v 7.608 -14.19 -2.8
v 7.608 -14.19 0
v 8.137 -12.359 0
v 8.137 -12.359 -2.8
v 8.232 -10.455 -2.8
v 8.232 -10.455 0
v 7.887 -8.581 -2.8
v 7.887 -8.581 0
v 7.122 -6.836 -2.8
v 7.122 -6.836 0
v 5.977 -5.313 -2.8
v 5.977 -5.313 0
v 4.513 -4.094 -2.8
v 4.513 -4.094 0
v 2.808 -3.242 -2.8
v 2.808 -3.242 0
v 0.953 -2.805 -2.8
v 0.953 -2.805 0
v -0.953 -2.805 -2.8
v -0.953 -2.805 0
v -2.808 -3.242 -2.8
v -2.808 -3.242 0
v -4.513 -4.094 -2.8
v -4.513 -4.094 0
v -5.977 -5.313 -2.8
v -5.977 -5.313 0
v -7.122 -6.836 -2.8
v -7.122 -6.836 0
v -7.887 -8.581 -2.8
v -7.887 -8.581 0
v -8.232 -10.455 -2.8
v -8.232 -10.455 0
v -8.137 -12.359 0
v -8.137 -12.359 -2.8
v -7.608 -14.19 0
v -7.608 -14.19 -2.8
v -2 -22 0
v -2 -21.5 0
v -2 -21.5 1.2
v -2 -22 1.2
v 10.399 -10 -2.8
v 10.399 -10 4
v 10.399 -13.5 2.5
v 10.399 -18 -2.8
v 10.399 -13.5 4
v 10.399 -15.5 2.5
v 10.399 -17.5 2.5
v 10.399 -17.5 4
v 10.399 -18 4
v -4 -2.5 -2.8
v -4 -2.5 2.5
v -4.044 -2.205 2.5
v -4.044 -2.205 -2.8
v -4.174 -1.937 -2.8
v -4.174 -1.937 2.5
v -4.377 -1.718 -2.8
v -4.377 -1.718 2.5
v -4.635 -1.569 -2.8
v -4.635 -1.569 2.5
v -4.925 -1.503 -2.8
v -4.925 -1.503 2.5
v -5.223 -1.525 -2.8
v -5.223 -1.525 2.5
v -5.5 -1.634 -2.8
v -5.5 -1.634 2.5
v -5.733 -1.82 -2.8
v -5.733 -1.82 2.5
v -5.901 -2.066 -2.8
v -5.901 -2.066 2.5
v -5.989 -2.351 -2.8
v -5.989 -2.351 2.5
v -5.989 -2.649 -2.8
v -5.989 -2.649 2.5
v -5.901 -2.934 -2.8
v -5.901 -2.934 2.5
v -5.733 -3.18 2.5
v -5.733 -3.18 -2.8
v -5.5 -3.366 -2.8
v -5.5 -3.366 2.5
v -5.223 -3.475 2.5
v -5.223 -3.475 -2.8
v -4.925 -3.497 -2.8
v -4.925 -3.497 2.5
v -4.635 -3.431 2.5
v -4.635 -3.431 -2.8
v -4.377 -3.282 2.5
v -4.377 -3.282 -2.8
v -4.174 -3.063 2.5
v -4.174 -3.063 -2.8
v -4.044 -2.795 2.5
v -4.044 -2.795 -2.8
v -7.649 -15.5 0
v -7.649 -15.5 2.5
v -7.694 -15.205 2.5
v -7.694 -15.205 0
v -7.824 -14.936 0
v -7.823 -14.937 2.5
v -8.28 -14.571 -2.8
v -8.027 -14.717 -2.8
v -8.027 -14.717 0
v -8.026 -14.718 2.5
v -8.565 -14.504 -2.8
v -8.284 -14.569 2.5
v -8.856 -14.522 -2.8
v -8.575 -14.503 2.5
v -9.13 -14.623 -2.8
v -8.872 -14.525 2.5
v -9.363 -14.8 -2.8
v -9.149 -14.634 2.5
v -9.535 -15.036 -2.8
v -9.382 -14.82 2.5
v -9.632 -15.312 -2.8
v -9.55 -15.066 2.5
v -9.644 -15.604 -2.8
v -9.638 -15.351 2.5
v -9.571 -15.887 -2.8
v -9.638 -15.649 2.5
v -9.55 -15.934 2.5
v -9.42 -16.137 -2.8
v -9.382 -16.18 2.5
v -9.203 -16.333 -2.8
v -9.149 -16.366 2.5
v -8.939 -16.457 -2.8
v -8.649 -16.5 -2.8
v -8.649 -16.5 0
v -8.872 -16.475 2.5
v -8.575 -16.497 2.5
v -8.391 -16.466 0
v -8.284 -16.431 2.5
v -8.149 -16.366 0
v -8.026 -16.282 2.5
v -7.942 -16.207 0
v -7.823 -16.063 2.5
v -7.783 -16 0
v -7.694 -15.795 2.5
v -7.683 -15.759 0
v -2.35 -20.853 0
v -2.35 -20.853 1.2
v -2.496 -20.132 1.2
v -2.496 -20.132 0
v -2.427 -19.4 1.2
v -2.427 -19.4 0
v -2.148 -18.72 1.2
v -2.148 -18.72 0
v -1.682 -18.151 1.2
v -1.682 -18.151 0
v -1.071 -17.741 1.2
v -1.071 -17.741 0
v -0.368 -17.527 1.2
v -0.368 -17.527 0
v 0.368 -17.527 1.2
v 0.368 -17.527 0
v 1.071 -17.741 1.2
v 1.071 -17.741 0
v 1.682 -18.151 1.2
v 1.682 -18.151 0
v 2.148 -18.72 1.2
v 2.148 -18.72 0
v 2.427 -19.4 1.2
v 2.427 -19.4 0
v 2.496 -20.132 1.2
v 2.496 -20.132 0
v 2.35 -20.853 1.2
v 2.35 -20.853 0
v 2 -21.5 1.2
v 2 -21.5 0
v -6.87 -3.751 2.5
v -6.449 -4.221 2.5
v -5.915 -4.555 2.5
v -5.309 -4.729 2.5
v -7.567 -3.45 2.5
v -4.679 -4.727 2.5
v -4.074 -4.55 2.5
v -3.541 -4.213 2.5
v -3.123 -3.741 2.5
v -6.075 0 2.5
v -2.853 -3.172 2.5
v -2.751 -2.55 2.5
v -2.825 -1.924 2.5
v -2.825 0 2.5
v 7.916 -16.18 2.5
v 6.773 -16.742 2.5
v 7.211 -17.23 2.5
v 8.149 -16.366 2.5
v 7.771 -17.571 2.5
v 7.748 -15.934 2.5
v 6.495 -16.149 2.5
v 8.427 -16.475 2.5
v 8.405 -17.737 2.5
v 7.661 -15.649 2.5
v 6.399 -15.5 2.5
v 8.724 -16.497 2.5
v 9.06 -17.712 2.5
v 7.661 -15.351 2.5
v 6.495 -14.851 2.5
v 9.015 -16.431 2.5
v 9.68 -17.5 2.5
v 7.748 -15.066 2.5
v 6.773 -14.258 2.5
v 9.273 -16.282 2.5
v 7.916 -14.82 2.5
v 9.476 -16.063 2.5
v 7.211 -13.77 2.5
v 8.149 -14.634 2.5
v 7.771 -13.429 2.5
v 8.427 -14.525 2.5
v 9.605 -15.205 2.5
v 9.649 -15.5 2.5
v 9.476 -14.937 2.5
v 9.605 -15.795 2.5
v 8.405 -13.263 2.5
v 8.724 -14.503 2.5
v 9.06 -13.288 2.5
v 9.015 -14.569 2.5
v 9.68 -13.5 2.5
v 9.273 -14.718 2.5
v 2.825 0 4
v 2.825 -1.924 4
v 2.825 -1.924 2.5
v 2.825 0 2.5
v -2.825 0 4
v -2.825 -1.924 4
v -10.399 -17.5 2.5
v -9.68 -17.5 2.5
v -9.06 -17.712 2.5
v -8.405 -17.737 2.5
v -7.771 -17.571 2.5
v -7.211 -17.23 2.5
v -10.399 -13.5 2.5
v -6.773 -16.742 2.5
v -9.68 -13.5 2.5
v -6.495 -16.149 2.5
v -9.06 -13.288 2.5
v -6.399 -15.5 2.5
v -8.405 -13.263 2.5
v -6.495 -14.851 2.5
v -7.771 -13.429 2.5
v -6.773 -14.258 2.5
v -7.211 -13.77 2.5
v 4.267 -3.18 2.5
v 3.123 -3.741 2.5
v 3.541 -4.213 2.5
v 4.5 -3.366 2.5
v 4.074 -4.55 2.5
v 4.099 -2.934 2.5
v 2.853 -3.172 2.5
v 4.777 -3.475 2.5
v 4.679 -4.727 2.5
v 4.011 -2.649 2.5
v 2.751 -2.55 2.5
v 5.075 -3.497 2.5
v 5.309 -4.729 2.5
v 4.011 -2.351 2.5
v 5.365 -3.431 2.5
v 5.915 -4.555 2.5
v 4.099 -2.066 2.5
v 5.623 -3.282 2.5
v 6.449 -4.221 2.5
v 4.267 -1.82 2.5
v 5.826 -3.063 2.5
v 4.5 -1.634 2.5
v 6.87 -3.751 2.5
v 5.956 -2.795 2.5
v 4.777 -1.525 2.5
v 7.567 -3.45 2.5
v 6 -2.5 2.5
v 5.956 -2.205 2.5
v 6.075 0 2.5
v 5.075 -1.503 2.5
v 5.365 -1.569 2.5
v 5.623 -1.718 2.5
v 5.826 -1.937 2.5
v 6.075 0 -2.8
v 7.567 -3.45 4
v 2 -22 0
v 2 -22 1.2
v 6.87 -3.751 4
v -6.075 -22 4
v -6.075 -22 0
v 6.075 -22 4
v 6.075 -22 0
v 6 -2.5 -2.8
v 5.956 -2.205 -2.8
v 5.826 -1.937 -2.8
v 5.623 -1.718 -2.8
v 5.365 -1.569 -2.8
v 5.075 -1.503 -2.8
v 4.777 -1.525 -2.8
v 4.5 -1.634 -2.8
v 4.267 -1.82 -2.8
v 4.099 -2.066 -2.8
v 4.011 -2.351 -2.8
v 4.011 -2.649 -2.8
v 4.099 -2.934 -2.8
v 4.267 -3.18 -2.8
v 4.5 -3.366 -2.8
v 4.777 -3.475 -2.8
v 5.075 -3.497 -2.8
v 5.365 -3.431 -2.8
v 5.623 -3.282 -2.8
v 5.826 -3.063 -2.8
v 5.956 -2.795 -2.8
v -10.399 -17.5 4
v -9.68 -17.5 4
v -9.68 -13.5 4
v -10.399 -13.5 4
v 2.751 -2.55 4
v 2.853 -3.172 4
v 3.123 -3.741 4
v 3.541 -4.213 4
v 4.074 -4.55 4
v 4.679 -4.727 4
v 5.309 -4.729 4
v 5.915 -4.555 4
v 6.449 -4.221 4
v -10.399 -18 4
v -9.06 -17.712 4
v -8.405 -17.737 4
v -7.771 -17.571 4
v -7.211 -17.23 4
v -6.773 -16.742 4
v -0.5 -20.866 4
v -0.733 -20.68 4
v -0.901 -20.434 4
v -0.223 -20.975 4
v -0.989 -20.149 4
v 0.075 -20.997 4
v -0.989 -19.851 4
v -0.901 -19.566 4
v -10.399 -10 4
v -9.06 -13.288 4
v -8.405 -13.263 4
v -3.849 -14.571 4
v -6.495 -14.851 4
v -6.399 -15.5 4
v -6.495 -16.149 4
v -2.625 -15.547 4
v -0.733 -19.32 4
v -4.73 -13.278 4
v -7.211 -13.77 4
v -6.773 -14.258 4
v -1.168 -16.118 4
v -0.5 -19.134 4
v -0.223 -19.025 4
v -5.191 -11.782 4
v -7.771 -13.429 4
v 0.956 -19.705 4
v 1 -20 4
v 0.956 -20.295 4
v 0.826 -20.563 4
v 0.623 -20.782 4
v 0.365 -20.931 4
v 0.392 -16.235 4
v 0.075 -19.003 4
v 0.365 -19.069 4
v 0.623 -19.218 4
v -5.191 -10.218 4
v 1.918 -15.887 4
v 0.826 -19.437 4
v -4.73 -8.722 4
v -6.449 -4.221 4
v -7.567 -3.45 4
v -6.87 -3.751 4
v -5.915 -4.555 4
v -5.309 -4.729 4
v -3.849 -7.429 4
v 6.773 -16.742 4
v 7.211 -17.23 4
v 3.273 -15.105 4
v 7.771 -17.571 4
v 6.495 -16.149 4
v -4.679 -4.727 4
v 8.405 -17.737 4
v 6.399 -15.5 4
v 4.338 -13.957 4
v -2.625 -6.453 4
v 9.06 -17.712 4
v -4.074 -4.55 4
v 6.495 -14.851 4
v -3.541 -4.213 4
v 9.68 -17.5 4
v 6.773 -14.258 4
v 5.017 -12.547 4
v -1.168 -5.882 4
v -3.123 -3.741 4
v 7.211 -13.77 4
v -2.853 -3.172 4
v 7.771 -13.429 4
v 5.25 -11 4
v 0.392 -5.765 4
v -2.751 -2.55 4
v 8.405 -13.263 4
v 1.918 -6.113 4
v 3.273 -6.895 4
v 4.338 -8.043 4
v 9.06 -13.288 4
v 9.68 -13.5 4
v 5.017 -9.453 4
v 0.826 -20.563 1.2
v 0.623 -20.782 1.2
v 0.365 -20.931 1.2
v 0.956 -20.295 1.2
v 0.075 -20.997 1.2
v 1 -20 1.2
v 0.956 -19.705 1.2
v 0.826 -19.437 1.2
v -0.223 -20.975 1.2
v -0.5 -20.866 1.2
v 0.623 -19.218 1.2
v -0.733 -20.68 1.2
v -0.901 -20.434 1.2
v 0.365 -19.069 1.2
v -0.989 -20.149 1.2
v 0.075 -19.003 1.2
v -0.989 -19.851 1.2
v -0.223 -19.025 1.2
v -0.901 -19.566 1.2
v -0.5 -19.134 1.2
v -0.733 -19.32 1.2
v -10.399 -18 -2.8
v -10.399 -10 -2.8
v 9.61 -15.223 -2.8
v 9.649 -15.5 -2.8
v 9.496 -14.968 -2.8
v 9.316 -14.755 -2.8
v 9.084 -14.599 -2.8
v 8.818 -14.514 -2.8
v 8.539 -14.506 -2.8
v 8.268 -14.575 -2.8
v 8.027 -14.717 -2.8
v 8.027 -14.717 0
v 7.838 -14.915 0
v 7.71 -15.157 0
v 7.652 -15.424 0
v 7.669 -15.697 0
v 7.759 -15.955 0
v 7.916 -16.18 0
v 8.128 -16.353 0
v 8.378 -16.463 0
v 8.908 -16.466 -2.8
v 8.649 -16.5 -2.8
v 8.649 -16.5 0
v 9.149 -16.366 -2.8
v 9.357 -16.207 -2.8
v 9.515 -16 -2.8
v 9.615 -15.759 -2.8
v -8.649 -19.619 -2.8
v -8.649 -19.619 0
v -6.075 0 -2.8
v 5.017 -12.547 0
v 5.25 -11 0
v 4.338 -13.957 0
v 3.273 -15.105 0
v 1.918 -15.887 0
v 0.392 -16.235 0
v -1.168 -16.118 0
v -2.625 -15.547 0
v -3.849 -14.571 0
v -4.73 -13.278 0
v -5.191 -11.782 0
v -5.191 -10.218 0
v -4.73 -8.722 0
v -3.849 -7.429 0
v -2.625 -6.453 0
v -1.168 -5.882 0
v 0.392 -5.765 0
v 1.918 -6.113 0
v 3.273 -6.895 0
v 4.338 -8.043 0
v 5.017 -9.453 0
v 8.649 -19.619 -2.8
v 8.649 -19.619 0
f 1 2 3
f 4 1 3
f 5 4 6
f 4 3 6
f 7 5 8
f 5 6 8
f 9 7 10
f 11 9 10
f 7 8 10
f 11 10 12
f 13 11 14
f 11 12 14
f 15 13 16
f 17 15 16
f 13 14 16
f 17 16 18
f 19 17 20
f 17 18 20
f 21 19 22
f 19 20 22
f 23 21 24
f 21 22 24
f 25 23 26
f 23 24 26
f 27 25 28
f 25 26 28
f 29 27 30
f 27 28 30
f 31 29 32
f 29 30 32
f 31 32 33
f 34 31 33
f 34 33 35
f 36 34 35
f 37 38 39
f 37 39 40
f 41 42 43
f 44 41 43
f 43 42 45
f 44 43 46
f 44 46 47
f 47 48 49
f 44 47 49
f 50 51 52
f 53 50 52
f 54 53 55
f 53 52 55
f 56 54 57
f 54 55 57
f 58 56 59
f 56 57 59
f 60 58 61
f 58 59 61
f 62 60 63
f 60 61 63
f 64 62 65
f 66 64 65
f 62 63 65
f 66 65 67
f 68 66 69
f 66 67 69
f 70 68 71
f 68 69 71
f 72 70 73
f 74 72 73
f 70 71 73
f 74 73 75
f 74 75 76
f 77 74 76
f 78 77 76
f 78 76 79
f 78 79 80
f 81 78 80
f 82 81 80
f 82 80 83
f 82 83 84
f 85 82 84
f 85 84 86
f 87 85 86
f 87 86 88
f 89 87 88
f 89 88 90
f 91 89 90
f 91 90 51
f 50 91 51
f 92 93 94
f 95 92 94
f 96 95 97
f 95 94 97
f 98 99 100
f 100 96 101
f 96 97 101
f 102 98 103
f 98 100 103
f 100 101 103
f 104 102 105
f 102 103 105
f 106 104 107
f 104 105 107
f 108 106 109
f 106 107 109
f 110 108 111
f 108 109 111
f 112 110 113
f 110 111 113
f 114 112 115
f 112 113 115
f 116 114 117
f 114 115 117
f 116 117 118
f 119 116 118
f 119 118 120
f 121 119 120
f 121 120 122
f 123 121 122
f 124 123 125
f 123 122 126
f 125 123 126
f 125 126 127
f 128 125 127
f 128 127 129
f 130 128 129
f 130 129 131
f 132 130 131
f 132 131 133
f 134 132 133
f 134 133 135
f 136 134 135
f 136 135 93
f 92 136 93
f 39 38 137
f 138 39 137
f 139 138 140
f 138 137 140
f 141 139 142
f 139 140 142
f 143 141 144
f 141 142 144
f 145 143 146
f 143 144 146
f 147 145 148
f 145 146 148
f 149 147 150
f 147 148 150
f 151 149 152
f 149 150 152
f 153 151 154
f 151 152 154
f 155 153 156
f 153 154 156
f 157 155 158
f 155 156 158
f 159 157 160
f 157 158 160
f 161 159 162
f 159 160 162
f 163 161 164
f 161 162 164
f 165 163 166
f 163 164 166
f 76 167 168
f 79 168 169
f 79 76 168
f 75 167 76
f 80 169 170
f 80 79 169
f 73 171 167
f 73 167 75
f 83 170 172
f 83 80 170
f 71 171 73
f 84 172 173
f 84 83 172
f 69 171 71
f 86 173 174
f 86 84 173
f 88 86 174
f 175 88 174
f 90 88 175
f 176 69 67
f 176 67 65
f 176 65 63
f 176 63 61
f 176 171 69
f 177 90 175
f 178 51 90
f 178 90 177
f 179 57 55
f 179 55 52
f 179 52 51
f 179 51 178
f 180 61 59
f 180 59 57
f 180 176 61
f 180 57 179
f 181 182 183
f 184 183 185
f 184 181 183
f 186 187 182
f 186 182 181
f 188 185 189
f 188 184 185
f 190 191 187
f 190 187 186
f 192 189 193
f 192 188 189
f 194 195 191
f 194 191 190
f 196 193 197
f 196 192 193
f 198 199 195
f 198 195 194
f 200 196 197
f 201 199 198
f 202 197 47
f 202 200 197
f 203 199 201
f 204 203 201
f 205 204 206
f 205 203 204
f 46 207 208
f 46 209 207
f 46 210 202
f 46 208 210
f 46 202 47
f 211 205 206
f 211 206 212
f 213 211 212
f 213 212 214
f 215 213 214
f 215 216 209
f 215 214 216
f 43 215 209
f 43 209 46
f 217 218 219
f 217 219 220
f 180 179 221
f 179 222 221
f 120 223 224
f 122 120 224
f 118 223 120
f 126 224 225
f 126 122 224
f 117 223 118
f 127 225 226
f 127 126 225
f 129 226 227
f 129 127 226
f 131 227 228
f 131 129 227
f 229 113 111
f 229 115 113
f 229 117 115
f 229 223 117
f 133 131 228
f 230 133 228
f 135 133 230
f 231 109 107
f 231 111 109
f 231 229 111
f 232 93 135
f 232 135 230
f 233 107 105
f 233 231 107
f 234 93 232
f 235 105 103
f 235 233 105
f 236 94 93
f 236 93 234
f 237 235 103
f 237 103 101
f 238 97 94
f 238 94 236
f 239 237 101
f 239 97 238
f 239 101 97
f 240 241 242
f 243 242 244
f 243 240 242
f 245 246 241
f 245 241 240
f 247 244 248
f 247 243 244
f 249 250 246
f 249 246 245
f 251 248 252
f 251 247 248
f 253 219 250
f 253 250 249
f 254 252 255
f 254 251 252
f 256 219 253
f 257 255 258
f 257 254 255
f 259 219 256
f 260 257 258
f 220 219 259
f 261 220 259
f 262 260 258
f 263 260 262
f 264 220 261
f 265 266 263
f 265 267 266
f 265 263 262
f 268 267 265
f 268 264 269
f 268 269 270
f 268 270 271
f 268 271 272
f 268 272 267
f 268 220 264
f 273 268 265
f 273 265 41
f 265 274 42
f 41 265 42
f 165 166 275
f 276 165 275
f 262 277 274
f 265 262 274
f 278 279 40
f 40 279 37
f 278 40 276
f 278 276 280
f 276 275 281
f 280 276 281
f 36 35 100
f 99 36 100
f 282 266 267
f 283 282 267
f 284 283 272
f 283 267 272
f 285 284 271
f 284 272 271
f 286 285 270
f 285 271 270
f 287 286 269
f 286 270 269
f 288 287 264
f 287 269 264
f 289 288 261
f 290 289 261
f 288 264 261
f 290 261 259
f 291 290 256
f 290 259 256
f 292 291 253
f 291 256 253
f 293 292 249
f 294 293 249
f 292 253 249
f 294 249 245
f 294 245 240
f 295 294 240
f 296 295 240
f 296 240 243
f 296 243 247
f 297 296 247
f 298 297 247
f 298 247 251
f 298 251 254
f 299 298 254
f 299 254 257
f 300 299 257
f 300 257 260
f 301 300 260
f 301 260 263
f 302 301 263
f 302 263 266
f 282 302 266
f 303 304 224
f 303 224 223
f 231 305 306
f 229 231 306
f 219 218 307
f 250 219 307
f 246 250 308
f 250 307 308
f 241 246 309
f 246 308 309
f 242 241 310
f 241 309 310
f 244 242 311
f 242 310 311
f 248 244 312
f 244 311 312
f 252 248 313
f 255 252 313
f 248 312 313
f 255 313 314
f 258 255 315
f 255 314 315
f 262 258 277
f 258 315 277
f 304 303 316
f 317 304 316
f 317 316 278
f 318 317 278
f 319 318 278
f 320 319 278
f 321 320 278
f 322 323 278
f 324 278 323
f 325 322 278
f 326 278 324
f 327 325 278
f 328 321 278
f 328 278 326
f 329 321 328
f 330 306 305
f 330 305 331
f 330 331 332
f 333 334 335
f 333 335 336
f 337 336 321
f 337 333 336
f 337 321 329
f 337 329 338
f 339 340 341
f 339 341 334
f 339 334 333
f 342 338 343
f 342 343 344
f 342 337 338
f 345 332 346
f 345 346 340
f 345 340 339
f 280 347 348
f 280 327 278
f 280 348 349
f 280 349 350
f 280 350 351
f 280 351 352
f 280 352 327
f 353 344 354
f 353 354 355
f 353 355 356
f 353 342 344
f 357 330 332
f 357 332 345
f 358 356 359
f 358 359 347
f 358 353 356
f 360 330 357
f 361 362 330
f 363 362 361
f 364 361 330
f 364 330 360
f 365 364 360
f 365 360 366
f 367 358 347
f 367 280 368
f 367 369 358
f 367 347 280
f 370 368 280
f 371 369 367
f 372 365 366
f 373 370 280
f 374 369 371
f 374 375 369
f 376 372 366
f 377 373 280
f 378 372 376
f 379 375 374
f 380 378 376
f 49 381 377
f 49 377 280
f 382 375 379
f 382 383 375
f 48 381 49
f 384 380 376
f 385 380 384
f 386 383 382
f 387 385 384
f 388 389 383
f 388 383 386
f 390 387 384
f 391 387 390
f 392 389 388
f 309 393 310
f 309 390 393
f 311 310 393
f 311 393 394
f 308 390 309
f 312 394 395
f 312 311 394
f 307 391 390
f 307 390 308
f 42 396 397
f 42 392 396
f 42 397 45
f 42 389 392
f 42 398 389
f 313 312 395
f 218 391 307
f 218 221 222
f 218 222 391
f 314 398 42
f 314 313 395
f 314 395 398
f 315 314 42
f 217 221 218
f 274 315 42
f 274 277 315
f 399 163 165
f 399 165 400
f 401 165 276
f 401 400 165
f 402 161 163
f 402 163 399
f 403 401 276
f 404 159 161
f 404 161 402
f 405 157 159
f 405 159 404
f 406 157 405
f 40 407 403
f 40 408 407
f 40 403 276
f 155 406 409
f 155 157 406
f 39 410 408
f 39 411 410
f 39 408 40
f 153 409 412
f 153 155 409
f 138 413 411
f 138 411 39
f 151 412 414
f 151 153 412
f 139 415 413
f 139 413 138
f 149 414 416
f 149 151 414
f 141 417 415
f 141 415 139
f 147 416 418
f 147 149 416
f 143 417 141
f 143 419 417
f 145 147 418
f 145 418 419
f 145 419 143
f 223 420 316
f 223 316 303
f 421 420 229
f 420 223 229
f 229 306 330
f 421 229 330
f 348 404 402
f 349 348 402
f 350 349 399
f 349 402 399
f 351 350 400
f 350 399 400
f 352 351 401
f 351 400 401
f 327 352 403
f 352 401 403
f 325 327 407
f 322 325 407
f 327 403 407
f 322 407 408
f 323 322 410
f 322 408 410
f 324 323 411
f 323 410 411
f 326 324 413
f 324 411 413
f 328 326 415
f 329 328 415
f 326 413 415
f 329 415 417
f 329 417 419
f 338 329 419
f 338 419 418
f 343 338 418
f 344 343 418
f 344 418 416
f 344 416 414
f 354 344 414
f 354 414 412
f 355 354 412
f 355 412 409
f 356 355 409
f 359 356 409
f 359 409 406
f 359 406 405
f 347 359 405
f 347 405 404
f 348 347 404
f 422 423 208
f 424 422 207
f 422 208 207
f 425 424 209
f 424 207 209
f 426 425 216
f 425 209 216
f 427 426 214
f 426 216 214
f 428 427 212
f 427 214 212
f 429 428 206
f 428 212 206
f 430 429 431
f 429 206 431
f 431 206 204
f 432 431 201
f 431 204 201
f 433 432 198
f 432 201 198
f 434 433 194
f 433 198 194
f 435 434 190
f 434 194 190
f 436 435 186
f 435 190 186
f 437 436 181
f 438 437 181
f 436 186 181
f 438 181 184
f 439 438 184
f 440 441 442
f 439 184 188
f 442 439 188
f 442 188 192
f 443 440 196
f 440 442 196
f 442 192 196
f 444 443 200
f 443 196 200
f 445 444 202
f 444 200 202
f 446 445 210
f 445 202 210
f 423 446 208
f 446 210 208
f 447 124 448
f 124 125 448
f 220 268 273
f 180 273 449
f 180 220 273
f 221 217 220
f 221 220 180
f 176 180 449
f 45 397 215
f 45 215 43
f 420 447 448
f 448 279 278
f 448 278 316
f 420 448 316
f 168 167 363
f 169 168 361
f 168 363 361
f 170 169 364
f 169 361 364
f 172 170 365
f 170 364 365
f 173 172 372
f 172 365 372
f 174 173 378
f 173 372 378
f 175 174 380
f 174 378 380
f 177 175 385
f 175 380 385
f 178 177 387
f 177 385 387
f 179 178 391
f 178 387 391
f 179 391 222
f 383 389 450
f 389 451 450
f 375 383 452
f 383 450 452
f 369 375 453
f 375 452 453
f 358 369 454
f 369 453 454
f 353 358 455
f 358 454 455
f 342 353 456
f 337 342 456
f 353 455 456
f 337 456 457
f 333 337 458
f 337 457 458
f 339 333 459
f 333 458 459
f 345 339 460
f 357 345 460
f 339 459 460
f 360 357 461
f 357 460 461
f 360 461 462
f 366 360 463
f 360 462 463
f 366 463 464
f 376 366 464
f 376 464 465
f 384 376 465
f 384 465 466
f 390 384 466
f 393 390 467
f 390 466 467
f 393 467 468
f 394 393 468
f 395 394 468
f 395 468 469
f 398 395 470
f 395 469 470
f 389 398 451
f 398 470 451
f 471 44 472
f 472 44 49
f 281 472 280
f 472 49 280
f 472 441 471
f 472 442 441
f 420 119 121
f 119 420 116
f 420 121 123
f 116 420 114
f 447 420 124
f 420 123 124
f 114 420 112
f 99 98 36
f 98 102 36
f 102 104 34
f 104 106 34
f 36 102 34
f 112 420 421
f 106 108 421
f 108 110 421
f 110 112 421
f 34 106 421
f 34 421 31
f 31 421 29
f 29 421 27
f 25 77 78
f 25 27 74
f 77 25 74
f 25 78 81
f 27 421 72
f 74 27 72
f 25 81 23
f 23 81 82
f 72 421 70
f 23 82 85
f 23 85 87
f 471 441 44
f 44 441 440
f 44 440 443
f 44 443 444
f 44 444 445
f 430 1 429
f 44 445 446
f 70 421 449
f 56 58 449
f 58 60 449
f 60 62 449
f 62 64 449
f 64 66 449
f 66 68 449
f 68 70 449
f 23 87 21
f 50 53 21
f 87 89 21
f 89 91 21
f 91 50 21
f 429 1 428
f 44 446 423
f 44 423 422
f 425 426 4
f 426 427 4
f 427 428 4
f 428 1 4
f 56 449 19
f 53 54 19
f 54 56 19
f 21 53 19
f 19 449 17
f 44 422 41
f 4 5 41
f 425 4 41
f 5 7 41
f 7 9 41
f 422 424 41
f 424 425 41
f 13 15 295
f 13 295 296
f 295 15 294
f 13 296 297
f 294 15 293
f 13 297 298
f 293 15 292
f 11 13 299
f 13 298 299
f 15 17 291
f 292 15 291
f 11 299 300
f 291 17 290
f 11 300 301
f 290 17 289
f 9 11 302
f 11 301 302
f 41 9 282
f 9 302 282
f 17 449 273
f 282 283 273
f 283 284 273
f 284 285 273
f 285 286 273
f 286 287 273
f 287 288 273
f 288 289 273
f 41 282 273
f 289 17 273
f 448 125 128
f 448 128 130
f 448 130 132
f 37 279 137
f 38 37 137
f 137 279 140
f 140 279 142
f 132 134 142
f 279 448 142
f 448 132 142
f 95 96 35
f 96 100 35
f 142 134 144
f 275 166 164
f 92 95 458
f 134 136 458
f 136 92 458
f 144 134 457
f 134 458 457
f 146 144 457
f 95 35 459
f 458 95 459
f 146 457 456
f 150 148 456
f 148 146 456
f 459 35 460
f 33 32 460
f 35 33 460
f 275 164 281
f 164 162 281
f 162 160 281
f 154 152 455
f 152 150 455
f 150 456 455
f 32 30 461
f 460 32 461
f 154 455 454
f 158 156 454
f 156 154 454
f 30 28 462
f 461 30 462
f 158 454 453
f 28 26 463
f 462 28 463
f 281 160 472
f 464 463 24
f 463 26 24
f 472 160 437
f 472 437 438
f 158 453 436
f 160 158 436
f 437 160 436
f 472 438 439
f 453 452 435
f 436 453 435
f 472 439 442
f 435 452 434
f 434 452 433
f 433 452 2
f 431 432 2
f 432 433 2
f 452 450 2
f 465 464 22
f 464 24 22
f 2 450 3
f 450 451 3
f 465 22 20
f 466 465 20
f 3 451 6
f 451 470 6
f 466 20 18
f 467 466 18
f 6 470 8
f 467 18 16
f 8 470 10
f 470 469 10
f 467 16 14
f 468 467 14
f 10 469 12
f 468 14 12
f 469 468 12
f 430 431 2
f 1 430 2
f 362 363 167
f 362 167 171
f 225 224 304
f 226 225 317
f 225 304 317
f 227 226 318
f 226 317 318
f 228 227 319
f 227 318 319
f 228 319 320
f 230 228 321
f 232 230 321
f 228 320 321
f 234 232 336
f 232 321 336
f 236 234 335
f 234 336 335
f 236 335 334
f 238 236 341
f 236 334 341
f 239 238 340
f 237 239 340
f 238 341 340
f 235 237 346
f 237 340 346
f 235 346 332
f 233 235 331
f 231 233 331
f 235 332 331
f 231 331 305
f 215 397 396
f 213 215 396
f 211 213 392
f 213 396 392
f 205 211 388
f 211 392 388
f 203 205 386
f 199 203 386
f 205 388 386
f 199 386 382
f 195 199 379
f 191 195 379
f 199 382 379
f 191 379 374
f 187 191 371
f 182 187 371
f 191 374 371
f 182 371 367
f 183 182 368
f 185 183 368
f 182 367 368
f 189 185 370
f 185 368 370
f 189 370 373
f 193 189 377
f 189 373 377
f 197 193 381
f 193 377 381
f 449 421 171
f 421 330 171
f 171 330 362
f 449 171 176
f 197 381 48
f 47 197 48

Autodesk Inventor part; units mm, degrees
ref_plane "YZ Plane" through (0, 0, 0) normal (1, 0, 0) x (0, 1, 0)
ref_plane "XZ Plane" through (0, 0, 0) normal (0, 1, 0) x (-1, 0, 0)
ref_plane "Work Plane1" through (0, 0, 0) normal (0, 0, 1) x (1, 0, 0)
sketch "Sketch1" plane through (0, 0, 0) normal (0, 0, 1) x (1, 0, 0)
  line L0 (-6.075, -22) -> (6.075, -22) projected
  line L1 (-6.075, -22) -> (-10.3994, -18) projected
  line L2 (-10.3994, -18) -> (-10.3994, -10) projected
  line L3 (-10.3994, -10) -> (-6.075, 0) projected
  line L4 (6.075, 0) -> (-6.075, 0) projected
  line L5 (6.075, 0) -> (10.3994, -10) projected
  line L6 (10.3994, -10) -> (10.3994, -18) projected
  line L7 (10.3994, -18) -> (6.075, -22) projected
  circle A0 centre (0, -11) radius 3.4 projected
  circle A1 centre (0, -20) radius 1 projected
  circle A2 centre (8.6494, -15.5) radius 1 projected
  circle A3 centre (-8.6494, -15.5) radius 1 projected
  circle A4 centre (0, -20) radius 2.5
  line L8 (-2, -21.5) -> (-2, -22)
  line L9 (2, -21.5) -> (2, -22)
  line L10 (0, -20) -> (0, -22) construction
  circle A5 centre (0, -11) radius 5.25
  line L11 (0, 4.5) -> (0, -27) projected
  circle A6 centre (-5, -2.5) radius 1 projected
  circle A7 centre (5, -2.5) radius 1 projected
  point P0 (0, 0)
  dimension "d0" = 5
  dimension "d1" = 4
  dimension "d2" = 10.5
extrude "ext_main" add sketch "Sketch1" along normal blind 4 contours L1 L2 L3 L4 L11 A5 A4 L8 L0 | L8 A4 L0 | A4 L11 A1 L0 | L11 A1 A4 L0 | L11 A5 L4 L5 L6 L7 L0 L9 A4 | A4 L9 L0
sketch "Sketch2" plane through (0, 0, 0) normal (0, 0, -1) x (-1, 0, 0)
  circle A0 centre (0, -20) radius 2.5 projected
  line L0 (-2, -21.5) -> (-2, -22) projected
  line L1 (2, -21.5) -> (2, -22) projected
  line L2 (-2, -22) -> (2, -22)
extrude "ext_cut_gearhousing" cut sketch "Sketch2" against normal blind 1.2
sketch "Sketch3" plane through (0, 0, 0) normal (0, 0, 1) x (1, 0, 0)
  line L0 (-10.3994, -18) -> (-10.3994, -10) projected
  line L1 (-6.075, -22) -> (-10.3994, -18) projected
  line L2 (-6.075, -22) -> (6.075, -22) projected
  line L3 (10.3994, -18) -> (6.075, -22) projected
  line L4 (10.3994, -10) -> (10.3994, -18) projected
  line L5 (6.075, 0) -> (10.3994, -10) projected
  line L6 (6.075, 0) -> (-6.075, 0) projected
  line L7 (-10.3994, -10) -> (-6.075, 0) projected
  circle A0 centre (-8.6494, -15.5) radius 1 projected
  circle A1 centre (8.6494, -15.5) radius 1 projected
  circle A2 centre (0, -20) radius 1 projected
  circle A3 centre (0, -11) radius 3.4 projected
  circle A4 centre (0, -20) radius 8 construction
  circle A5 centre (5.075, -11) radius 1 projected
  circle A6 centre (-5.075, -11) radius 1 projected
  circle A7 centre (-5.075, -11) radius 3 construction
  circle A8 centre (5.075, -11) radius 3 construction
  line L8 (-8.6494, -16.5) -> (-8.6494, -19.6187)
  line L9 (-5.075, -11) -> (-8.6494, -15.5) construction
  line L10 (5.075, -11) -> (8.6494, -15.5) construction
  line L11 (8.6494, -15.5) -> (8.6494, -19.6187) construction
  line L12 (8.6494, -16.5) -> (8.6494, -19.6187)
  arc A9 (-8.0274, -14.717) -> (-8.6494, -16.5) centre (-8.6494, -15.5) ccw
  arc A10 (8.6494, -16.5) -> (8.0274, -14.717) centre (8.6494, -15.5) ccw
  line L13 (-8.6494, -19.6187) -> (-10.3994, -18)
  line L14 (10.3994, -18) -> (8.6494, -19.6187)
  circle A11 centre (0, -11) radius 8.25 construction
  line L15 (-7.6085, -14.1895) -> (-8.0274, -14.717)
  line L16 (8.0274, -14.717) -> (7.6085, -14.1895)
  circle A12 centre (-5, -2.5) radius 1 projected
  circle A13 centre (5, -2.5) radius 1 projected
  arc A14 (7.6085, -14.1895) -> (-7.6085, -14.1895) centre (0, -11) ccw
  point P0 (-6.9409, -13.3491)
  point P1 (5.075, -8)
  point P2 (-5.075, -8)
  point P3 (6.9409, -13.3491)
  dimension "d7" = 16
  dimension "d8" = 6
  dimension "d20" = 16.5
ref_plane "Work Plane2" through (-10.3994, -22, -2.8) normal (0, 0, 1) x (1, 0, 0)
extrude "ext_base" add sketch "Sketch3" against normal up to surface (2.8 mm away) contours L0 L7 L6 L5 L4 L3 L12 A1 L16 A14 L15 A0 L8 L1
sketch "Sketch4" plane through (0, 0, 4) normal (0, 0, 1) x (1, 0, 0)
  circle A0 centre (8.6494, -15.5) radius 1 projected
  circle A1 centre (-8.6494, -15.5) radius 1 projected
  line L0 (10.3994, -18) -> (10.3994, -10) projected
  line L1 (-10.3994, -10) -> (-10.3994, -18) projected
  circle A2 centre (-8.6494, -15.5) radius 2.25
  circle A3 centre (8.6494, -15.5) radius 2.25
  line L2 (-9.6802, -13.5) -> (-10.3994, -13.5)
  line L3 (-9.6802, -17.5) -> (-10.3994, -17.5)
  line L4 (-8.6494, -15.5) -> (-10.3994, -15.5) construction
  line L5 (8.6494, -15.5) -> (10.3994, -15.5)
  line L6 (9.6802, -13.5) -> (10.3994, -13.5)
  line L7 (9.6802, -17.5) -> (10.3994, -17.5)
  circle A4 centre (-5, -2.5) radius 1 projected
  circle A5 centre (5, -2.5) radius 1 projected
  line L8 (10.3994, -10) -> (6.075, 0) projected
  line L9 (6.075, 0) -> (-6.075, 0) projected
  line L10 (-6.075, 0) -> (-10.3994, -10) projected
  circle A6 centre (-5, -2.5) radius 2.25
  circle A7 centre (5, -2.5) radius 2.25
  line L11 (-2.825, -1.9239) -> (-2.825, 0)
  line L12 (-6.8699, -3.7514) -> (-7.5669, -3.45)
  line L13 (0, 4.4) -> (0, -26.4) projected
  line L14 (2.825, -1.9239) -> (2.825, 0)
  line L15 (6.8699, -3.7514) -> (7.5669, -3.45)
  point P0 (0, 0)
  dimension "d11" = 4.5
  dimension "d12" = 4
  dimension "d13" = 4
  dimension "d18" = 3.25
  dimension "d19" = 3.45
extrude "ext_cut_screwheads" cut sketch "Sketch4" against normal blind 1.5 contours L0 A3 | L2 A2 L1 | L11 A6 L10 L9 | L15 A7 L8 | L0 L7 A3 | A3 L6 L0 | A7 L8 | L8 A7 | A7 L14 L9 L8 | A6 L10 | L10 A6 | A6 L12 L10 | A2 L1 | A2 L3 L1 | A4 | A5 picked at (10.1112, -14.8737) picked at (-10.1494, -15.5)
equation "\"d11\" = screw_m2_head_maxsize"
equation "\"screw_m2_head_maxsize\" = 4.5"
properties part number "linact_thumb_front"
